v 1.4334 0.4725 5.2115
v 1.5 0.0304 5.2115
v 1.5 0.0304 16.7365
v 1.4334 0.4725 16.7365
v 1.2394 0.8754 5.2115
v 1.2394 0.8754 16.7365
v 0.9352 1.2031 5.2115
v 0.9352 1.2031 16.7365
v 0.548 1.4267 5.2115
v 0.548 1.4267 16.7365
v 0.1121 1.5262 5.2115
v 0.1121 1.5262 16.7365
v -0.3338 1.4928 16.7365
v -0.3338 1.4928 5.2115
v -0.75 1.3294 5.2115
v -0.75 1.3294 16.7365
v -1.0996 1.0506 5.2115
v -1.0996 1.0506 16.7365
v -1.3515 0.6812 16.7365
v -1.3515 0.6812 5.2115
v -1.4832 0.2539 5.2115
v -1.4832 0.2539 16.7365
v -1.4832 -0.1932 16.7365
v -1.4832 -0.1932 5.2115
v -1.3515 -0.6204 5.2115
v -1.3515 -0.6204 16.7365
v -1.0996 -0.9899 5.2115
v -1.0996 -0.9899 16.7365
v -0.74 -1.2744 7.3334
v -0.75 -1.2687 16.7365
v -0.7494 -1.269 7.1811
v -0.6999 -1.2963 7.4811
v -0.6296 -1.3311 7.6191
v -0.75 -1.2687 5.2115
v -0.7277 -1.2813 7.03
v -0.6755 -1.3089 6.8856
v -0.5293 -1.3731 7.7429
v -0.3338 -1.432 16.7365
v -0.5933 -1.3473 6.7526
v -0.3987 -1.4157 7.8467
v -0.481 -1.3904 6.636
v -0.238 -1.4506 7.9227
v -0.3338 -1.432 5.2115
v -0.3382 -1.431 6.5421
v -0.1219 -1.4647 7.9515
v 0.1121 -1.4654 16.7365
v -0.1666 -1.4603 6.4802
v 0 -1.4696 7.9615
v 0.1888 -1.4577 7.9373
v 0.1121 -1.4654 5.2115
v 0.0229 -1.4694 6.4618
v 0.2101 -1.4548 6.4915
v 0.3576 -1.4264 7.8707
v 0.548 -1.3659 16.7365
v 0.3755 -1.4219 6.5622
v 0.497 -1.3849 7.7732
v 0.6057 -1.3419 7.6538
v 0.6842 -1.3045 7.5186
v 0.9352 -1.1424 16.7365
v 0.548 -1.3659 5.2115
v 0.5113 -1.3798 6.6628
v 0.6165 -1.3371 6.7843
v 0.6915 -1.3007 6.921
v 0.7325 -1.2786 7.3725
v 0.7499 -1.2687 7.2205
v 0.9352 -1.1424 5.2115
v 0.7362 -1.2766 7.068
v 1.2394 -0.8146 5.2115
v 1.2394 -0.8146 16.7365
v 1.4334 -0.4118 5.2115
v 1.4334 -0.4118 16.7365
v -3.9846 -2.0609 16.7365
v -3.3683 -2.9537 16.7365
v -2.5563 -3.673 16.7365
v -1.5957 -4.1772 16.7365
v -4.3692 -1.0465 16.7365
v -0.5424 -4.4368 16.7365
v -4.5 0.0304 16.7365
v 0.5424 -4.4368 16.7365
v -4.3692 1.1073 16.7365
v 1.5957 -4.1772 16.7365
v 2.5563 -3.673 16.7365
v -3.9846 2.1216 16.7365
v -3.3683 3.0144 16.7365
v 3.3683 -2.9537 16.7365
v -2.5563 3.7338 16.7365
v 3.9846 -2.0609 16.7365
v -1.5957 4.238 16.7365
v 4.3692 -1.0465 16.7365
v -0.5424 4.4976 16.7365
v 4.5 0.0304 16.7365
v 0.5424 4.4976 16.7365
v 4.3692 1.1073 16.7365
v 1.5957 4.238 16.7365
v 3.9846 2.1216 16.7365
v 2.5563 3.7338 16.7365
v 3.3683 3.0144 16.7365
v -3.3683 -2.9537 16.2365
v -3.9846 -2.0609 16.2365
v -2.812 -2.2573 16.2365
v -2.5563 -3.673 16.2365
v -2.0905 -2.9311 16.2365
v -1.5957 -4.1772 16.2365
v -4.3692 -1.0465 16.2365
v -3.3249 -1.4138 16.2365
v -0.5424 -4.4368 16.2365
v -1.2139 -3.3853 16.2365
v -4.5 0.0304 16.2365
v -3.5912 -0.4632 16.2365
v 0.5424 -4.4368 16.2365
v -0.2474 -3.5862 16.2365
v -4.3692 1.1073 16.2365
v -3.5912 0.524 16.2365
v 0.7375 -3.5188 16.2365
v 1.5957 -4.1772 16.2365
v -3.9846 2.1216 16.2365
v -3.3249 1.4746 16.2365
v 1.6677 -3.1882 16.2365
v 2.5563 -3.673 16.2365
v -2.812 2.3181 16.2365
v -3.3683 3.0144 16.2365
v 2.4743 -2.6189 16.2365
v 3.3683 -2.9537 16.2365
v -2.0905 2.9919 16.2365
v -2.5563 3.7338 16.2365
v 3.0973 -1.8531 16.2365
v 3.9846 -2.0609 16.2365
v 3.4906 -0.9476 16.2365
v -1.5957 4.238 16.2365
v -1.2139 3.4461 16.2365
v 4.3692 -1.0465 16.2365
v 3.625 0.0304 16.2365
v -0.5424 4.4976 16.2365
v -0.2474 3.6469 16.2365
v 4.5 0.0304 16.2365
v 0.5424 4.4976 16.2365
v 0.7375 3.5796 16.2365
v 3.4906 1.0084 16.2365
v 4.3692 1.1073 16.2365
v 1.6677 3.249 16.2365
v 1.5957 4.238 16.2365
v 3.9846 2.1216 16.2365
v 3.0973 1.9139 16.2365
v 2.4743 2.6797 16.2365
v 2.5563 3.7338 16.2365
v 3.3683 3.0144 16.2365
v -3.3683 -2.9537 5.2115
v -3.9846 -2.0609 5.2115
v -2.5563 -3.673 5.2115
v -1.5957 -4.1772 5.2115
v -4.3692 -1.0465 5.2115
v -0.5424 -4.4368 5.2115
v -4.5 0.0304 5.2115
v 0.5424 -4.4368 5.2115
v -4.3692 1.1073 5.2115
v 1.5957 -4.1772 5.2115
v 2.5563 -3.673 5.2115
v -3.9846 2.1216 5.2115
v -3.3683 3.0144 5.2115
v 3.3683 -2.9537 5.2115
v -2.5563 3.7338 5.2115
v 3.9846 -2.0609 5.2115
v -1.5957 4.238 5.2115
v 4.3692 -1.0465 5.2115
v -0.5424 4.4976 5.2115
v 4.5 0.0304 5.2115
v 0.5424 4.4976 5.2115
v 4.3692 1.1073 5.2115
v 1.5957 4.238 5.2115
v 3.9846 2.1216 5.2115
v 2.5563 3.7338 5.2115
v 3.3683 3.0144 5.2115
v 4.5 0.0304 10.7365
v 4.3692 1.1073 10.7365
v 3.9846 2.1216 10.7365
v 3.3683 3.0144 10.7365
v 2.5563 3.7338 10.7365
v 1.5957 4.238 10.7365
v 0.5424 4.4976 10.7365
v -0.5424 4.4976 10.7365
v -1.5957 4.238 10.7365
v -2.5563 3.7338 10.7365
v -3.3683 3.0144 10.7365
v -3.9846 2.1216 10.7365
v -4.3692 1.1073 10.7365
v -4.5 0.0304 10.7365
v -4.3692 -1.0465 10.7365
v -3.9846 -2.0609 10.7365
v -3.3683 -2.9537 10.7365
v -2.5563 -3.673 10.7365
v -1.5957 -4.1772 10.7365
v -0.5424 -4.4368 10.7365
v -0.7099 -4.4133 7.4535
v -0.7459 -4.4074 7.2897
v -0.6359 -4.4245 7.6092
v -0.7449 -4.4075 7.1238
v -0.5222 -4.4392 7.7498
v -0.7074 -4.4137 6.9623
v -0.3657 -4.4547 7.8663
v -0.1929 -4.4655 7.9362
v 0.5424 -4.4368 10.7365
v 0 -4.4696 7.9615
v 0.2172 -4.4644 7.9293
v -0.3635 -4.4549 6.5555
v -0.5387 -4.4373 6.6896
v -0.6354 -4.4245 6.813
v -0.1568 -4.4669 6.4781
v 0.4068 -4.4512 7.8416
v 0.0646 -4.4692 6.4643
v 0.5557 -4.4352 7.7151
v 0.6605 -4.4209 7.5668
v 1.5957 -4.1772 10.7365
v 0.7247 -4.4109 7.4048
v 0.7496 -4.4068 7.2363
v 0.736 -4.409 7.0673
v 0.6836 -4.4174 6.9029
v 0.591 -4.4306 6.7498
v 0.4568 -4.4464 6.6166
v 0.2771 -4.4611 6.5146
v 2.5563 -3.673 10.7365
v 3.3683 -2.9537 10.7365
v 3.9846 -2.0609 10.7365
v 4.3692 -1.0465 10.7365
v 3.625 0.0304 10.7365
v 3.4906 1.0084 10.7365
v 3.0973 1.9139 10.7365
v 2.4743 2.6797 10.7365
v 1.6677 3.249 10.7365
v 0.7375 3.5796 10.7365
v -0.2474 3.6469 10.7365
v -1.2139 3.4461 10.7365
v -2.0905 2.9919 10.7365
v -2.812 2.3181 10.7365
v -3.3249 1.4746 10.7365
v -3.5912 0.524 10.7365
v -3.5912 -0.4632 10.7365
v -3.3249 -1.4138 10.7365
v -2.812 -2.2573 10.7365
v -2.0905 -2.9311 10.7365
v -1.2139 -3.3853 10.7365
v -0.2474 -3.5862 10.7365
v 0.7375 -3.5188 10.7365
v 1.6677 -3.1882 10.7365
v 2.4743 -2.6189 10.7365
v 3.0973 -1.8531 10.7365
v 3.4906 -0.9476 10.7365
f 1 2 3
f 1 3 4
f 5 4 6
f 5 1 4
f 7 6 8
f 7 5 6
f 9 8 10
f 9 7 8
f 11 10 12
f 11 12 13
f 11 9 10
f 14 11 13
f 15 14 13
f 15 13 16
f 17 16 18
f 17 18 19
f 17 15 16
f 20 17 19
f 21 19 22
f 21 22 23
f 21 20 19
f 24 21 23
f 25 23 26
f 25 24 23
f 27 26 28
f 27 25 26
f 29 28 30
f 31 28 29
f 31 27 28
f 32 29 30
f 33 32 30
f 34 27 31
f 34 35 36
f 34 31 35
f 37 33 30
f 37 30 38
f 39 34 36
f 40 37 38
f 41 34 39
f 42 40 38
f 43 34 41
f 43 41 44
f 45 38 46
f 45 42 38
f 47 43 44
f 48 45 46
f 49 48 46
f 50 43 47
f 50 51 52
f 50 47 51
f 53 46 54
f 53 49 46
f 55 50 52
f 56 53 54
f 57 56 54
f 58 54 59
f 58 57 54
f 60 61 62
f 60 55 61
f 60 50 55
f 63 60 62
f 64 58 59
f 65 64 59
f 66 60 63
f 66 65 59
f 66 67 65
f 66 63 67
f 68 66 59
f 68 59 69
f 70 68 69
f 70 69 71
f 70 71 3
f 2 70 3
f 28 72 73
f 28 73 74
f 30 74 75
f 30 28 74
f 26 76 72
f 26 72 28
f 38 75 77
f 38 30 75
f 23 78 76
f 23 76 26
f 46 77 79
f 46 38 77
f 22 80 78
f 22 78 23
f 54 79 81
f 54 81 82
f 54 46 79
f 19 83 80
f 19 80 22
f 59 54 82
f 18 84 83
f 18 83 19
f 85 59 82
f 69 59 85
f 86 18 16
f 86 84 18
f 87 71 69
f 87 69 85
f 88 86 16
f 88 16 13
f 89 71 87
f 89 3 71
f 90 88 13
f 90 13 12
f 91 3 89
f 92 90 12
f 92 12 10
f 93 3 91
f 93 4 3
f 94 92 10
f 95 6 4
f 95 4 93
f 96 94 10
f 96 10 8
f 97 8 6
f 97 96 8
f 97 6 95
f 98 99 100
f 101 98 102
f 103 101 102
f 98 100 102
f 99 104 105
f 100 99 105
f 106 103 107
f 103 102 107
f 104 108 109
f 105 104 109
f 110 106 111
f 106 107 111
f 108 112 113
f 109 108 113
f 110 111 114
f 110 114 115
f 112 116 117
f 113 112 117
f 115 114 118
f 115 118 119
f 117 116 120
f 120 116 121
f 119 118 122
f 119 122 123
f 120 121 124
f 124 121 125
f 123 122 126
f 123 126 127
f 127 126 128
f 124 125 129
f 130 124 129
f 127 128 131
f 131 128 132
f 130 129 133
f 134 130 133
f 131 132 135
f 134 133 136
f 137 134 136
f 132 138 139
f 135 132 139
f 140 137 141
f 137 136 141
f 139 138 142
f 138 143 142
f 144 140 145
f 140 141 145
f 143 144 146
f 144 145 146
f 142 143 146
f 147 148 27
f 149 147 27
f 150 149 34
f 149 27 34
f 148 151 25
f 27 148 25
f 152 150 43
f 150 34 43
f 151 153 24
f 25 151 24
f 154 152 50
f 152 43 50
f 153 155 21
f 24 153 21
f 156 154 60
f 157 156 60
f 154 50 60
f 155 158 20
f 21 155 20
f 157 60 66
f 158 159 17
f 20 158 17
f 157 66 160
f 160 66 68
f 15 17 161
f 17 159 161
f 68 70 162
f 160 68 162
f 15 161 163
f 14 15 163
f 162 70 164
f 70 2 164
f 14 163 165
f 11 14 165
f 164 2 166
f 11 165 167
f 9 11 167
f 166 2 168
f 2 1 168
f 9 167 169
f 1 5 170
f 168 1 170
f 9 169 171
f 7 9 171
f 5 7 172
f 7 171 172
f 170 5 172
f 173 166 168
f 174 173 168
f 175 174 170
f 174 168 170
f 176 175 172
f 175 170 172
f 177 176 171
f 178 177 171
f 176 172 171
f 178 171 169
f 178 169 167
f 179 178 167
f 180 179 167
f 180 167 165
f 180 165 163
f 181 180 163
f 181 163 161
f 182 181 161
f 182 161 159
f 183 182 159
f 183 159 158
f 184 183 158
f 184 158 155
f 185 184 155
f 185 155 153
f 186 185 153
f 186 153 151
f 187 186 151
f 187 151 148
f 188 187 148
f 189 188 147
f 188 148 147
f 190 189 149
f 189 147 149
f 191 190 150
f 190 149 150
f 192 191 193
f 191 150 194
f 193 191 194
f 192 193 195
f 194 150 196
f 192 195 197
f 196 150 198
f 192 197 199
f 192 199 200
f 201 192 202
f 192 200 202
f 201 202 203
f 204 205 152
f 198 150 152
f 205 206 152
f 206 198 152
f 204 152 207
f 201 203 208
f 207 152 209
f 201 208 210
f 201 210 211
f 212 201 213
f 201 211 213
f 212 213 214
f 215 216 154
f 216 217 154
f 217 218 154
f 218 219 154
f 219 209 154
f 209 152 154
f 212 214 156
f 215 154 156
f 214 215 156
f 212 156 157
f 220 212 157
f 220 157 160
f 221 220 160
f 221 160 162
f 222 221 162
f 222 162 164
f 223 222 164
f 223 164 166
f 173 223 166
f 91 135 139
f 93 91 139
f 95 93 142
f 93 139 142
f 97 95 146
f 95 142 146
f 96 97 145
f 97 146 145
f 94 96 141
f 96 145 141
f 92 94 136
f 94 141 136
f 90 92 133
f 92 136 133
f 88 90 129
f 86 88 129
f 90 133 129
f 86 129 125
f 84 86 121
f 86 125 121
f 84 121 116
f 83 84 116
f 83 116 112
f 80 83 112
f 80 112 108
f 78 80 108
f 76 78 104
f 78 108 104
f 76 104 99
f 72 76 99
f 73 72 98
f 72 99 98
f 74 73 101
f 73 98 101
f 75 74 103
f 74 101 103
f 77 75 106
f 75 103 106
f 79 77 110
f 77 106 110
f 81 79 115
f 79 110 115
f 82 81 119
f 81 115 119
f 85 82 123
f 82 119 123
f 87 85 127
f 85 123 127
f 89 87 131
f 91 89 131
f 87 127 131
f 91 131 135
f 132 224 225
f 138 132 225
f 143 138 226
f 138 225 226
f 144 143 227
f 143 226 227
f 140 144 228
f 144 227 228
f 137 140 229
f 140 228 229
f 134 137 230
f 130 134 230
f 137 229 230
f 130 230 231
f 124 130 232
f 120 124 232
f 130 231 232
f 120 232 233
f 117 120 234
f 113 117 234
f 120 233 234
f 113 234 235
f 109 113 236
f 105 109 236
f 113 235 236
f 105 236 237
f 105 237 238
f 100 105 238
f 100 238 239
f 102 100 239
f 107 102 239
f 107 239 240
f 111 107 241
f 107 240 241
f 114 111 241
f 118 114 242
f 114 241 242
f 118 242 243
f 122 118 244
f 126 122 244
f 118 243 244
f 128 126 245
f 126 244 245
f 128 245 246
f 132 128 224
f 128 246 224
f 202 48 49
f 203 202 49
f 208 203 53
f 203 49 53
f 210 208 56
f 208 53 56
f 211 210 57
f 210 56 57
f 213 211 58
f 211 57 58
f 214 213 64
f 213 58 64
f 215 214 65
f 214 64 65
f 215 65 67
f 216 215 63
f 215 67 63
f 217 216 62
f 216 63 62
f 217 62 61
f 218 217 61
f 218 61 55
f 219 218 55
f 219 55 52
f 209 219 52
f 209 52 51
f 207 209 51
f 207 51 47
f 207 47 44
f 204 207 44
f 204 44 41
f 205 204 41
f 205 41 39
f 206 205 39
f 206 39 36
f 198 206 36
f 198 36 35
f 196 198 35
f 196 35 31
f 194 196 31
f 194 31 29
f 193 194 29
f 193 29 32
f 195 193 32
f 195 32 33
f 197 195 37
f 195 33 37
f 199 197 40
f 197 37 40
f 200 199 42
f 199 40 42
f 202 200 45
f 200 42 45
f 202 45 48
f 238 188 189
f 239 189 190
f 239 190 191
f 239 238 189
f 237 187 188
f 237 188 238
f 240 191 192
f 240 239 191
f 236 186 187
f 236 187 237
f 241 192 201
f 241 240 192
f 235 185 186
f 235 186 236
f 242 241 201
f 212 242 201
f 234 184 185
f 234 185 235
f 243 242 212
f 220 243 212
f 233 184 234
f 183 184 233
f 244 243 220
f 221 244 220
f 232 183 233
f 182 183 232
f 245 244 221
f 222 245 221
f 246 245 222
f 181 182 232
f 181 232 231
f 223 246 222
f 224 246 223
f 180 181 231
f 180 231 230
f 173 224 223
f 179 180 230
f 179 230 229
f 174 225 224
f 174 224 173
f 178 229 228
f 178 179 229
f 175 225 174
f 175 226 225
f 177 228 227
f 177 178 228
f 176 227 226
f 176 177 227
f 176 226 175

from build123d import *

# Parameters (mm, degrees)
SKETCH1_R           = 9
SKETCH1_R_2         = 3
BOSS_EXTRUDE1_DEPTH = 11.05
SKETCH2_R           = 7.25
SKETCH2_R_2         = 3
BOSS_EXTRUDE2_DEPTH = 11
SKETCH3_R           = 9
SKETCH3_R_2         = 3
BOSS_EXTRUDE3_DEPTH = 1
SKETCH4_R           = 1.5
CUT_EXTRUDE1_DEPTH  = 27.330638048
ECHELLE1_SCALE      = 2
ECHELLE2_SCALE      = 0.25


with BuildPart() as part:
    # Sketch1 → Boss-Extrude1 (new body)
    with BuildSketch(Plane.XY):
        Circle(SKETCH1_R)
        Circle(SKETCH1_R_2, mode=Mode.SUBTRACT)
    extrude(amount=BOSS_EXTRUDE1_DEPTH)

    # Sketch2 → Boss-Extrude2 (add)
    with BuildSketch(Plane.XY.offset(11.05)):
        Circle(SKETCH2_R)
        Circle(SKETCH2_R_2, mode=Mode.SUBTRACT)
    extrude(amount=BOSS_EXTRUDE2_DEPTH)

    # Sketch3 → Boss-Extrude3 (add)
    with BuildSketch(Plane.XY.offset(22.05)):
        Circle(SKETCH3_R)
        Circle(SKETCH3_R_2, mode=Mode.SUBTRACT)
    extrude(amount=BOSS_EXTRUDE3_DEPTH)

    # Sketch4 → Cut-Extrude1 (cut, through all)
    with BuildSketch(Plane(origin=(0, 0, 0), x_dir=(1, 0, 0), z_dir=(0, 1, 0))):
        with Locations(Location((0, -4, 0), (0, 0, 270))):
            Circle(SKETCH4_R)
    extrude(amount=-CUT_EXTRUDE1_DEPTH, mode=Mode.SUBTRACT)


with BuildPart() as part_1:
    # Echelle1: scaled about (3.613e-06, 0.060757241, 10.422968187)
    add(part.part.scale(ECHELLE1_SCALE).moved(Location((-3.613e-06, -0.060757241, -10.422968187))))


with BuildPart() as part_2:
    # Echelle2: scaled about (3.614e-06, 0.060757242, 10.422968188)
    add(part_1.part.scale(ECHELLE2_SCALE).moved(Location((2.711e-06, 0.045567932, 7.817226141))))


solid = part_2.part
